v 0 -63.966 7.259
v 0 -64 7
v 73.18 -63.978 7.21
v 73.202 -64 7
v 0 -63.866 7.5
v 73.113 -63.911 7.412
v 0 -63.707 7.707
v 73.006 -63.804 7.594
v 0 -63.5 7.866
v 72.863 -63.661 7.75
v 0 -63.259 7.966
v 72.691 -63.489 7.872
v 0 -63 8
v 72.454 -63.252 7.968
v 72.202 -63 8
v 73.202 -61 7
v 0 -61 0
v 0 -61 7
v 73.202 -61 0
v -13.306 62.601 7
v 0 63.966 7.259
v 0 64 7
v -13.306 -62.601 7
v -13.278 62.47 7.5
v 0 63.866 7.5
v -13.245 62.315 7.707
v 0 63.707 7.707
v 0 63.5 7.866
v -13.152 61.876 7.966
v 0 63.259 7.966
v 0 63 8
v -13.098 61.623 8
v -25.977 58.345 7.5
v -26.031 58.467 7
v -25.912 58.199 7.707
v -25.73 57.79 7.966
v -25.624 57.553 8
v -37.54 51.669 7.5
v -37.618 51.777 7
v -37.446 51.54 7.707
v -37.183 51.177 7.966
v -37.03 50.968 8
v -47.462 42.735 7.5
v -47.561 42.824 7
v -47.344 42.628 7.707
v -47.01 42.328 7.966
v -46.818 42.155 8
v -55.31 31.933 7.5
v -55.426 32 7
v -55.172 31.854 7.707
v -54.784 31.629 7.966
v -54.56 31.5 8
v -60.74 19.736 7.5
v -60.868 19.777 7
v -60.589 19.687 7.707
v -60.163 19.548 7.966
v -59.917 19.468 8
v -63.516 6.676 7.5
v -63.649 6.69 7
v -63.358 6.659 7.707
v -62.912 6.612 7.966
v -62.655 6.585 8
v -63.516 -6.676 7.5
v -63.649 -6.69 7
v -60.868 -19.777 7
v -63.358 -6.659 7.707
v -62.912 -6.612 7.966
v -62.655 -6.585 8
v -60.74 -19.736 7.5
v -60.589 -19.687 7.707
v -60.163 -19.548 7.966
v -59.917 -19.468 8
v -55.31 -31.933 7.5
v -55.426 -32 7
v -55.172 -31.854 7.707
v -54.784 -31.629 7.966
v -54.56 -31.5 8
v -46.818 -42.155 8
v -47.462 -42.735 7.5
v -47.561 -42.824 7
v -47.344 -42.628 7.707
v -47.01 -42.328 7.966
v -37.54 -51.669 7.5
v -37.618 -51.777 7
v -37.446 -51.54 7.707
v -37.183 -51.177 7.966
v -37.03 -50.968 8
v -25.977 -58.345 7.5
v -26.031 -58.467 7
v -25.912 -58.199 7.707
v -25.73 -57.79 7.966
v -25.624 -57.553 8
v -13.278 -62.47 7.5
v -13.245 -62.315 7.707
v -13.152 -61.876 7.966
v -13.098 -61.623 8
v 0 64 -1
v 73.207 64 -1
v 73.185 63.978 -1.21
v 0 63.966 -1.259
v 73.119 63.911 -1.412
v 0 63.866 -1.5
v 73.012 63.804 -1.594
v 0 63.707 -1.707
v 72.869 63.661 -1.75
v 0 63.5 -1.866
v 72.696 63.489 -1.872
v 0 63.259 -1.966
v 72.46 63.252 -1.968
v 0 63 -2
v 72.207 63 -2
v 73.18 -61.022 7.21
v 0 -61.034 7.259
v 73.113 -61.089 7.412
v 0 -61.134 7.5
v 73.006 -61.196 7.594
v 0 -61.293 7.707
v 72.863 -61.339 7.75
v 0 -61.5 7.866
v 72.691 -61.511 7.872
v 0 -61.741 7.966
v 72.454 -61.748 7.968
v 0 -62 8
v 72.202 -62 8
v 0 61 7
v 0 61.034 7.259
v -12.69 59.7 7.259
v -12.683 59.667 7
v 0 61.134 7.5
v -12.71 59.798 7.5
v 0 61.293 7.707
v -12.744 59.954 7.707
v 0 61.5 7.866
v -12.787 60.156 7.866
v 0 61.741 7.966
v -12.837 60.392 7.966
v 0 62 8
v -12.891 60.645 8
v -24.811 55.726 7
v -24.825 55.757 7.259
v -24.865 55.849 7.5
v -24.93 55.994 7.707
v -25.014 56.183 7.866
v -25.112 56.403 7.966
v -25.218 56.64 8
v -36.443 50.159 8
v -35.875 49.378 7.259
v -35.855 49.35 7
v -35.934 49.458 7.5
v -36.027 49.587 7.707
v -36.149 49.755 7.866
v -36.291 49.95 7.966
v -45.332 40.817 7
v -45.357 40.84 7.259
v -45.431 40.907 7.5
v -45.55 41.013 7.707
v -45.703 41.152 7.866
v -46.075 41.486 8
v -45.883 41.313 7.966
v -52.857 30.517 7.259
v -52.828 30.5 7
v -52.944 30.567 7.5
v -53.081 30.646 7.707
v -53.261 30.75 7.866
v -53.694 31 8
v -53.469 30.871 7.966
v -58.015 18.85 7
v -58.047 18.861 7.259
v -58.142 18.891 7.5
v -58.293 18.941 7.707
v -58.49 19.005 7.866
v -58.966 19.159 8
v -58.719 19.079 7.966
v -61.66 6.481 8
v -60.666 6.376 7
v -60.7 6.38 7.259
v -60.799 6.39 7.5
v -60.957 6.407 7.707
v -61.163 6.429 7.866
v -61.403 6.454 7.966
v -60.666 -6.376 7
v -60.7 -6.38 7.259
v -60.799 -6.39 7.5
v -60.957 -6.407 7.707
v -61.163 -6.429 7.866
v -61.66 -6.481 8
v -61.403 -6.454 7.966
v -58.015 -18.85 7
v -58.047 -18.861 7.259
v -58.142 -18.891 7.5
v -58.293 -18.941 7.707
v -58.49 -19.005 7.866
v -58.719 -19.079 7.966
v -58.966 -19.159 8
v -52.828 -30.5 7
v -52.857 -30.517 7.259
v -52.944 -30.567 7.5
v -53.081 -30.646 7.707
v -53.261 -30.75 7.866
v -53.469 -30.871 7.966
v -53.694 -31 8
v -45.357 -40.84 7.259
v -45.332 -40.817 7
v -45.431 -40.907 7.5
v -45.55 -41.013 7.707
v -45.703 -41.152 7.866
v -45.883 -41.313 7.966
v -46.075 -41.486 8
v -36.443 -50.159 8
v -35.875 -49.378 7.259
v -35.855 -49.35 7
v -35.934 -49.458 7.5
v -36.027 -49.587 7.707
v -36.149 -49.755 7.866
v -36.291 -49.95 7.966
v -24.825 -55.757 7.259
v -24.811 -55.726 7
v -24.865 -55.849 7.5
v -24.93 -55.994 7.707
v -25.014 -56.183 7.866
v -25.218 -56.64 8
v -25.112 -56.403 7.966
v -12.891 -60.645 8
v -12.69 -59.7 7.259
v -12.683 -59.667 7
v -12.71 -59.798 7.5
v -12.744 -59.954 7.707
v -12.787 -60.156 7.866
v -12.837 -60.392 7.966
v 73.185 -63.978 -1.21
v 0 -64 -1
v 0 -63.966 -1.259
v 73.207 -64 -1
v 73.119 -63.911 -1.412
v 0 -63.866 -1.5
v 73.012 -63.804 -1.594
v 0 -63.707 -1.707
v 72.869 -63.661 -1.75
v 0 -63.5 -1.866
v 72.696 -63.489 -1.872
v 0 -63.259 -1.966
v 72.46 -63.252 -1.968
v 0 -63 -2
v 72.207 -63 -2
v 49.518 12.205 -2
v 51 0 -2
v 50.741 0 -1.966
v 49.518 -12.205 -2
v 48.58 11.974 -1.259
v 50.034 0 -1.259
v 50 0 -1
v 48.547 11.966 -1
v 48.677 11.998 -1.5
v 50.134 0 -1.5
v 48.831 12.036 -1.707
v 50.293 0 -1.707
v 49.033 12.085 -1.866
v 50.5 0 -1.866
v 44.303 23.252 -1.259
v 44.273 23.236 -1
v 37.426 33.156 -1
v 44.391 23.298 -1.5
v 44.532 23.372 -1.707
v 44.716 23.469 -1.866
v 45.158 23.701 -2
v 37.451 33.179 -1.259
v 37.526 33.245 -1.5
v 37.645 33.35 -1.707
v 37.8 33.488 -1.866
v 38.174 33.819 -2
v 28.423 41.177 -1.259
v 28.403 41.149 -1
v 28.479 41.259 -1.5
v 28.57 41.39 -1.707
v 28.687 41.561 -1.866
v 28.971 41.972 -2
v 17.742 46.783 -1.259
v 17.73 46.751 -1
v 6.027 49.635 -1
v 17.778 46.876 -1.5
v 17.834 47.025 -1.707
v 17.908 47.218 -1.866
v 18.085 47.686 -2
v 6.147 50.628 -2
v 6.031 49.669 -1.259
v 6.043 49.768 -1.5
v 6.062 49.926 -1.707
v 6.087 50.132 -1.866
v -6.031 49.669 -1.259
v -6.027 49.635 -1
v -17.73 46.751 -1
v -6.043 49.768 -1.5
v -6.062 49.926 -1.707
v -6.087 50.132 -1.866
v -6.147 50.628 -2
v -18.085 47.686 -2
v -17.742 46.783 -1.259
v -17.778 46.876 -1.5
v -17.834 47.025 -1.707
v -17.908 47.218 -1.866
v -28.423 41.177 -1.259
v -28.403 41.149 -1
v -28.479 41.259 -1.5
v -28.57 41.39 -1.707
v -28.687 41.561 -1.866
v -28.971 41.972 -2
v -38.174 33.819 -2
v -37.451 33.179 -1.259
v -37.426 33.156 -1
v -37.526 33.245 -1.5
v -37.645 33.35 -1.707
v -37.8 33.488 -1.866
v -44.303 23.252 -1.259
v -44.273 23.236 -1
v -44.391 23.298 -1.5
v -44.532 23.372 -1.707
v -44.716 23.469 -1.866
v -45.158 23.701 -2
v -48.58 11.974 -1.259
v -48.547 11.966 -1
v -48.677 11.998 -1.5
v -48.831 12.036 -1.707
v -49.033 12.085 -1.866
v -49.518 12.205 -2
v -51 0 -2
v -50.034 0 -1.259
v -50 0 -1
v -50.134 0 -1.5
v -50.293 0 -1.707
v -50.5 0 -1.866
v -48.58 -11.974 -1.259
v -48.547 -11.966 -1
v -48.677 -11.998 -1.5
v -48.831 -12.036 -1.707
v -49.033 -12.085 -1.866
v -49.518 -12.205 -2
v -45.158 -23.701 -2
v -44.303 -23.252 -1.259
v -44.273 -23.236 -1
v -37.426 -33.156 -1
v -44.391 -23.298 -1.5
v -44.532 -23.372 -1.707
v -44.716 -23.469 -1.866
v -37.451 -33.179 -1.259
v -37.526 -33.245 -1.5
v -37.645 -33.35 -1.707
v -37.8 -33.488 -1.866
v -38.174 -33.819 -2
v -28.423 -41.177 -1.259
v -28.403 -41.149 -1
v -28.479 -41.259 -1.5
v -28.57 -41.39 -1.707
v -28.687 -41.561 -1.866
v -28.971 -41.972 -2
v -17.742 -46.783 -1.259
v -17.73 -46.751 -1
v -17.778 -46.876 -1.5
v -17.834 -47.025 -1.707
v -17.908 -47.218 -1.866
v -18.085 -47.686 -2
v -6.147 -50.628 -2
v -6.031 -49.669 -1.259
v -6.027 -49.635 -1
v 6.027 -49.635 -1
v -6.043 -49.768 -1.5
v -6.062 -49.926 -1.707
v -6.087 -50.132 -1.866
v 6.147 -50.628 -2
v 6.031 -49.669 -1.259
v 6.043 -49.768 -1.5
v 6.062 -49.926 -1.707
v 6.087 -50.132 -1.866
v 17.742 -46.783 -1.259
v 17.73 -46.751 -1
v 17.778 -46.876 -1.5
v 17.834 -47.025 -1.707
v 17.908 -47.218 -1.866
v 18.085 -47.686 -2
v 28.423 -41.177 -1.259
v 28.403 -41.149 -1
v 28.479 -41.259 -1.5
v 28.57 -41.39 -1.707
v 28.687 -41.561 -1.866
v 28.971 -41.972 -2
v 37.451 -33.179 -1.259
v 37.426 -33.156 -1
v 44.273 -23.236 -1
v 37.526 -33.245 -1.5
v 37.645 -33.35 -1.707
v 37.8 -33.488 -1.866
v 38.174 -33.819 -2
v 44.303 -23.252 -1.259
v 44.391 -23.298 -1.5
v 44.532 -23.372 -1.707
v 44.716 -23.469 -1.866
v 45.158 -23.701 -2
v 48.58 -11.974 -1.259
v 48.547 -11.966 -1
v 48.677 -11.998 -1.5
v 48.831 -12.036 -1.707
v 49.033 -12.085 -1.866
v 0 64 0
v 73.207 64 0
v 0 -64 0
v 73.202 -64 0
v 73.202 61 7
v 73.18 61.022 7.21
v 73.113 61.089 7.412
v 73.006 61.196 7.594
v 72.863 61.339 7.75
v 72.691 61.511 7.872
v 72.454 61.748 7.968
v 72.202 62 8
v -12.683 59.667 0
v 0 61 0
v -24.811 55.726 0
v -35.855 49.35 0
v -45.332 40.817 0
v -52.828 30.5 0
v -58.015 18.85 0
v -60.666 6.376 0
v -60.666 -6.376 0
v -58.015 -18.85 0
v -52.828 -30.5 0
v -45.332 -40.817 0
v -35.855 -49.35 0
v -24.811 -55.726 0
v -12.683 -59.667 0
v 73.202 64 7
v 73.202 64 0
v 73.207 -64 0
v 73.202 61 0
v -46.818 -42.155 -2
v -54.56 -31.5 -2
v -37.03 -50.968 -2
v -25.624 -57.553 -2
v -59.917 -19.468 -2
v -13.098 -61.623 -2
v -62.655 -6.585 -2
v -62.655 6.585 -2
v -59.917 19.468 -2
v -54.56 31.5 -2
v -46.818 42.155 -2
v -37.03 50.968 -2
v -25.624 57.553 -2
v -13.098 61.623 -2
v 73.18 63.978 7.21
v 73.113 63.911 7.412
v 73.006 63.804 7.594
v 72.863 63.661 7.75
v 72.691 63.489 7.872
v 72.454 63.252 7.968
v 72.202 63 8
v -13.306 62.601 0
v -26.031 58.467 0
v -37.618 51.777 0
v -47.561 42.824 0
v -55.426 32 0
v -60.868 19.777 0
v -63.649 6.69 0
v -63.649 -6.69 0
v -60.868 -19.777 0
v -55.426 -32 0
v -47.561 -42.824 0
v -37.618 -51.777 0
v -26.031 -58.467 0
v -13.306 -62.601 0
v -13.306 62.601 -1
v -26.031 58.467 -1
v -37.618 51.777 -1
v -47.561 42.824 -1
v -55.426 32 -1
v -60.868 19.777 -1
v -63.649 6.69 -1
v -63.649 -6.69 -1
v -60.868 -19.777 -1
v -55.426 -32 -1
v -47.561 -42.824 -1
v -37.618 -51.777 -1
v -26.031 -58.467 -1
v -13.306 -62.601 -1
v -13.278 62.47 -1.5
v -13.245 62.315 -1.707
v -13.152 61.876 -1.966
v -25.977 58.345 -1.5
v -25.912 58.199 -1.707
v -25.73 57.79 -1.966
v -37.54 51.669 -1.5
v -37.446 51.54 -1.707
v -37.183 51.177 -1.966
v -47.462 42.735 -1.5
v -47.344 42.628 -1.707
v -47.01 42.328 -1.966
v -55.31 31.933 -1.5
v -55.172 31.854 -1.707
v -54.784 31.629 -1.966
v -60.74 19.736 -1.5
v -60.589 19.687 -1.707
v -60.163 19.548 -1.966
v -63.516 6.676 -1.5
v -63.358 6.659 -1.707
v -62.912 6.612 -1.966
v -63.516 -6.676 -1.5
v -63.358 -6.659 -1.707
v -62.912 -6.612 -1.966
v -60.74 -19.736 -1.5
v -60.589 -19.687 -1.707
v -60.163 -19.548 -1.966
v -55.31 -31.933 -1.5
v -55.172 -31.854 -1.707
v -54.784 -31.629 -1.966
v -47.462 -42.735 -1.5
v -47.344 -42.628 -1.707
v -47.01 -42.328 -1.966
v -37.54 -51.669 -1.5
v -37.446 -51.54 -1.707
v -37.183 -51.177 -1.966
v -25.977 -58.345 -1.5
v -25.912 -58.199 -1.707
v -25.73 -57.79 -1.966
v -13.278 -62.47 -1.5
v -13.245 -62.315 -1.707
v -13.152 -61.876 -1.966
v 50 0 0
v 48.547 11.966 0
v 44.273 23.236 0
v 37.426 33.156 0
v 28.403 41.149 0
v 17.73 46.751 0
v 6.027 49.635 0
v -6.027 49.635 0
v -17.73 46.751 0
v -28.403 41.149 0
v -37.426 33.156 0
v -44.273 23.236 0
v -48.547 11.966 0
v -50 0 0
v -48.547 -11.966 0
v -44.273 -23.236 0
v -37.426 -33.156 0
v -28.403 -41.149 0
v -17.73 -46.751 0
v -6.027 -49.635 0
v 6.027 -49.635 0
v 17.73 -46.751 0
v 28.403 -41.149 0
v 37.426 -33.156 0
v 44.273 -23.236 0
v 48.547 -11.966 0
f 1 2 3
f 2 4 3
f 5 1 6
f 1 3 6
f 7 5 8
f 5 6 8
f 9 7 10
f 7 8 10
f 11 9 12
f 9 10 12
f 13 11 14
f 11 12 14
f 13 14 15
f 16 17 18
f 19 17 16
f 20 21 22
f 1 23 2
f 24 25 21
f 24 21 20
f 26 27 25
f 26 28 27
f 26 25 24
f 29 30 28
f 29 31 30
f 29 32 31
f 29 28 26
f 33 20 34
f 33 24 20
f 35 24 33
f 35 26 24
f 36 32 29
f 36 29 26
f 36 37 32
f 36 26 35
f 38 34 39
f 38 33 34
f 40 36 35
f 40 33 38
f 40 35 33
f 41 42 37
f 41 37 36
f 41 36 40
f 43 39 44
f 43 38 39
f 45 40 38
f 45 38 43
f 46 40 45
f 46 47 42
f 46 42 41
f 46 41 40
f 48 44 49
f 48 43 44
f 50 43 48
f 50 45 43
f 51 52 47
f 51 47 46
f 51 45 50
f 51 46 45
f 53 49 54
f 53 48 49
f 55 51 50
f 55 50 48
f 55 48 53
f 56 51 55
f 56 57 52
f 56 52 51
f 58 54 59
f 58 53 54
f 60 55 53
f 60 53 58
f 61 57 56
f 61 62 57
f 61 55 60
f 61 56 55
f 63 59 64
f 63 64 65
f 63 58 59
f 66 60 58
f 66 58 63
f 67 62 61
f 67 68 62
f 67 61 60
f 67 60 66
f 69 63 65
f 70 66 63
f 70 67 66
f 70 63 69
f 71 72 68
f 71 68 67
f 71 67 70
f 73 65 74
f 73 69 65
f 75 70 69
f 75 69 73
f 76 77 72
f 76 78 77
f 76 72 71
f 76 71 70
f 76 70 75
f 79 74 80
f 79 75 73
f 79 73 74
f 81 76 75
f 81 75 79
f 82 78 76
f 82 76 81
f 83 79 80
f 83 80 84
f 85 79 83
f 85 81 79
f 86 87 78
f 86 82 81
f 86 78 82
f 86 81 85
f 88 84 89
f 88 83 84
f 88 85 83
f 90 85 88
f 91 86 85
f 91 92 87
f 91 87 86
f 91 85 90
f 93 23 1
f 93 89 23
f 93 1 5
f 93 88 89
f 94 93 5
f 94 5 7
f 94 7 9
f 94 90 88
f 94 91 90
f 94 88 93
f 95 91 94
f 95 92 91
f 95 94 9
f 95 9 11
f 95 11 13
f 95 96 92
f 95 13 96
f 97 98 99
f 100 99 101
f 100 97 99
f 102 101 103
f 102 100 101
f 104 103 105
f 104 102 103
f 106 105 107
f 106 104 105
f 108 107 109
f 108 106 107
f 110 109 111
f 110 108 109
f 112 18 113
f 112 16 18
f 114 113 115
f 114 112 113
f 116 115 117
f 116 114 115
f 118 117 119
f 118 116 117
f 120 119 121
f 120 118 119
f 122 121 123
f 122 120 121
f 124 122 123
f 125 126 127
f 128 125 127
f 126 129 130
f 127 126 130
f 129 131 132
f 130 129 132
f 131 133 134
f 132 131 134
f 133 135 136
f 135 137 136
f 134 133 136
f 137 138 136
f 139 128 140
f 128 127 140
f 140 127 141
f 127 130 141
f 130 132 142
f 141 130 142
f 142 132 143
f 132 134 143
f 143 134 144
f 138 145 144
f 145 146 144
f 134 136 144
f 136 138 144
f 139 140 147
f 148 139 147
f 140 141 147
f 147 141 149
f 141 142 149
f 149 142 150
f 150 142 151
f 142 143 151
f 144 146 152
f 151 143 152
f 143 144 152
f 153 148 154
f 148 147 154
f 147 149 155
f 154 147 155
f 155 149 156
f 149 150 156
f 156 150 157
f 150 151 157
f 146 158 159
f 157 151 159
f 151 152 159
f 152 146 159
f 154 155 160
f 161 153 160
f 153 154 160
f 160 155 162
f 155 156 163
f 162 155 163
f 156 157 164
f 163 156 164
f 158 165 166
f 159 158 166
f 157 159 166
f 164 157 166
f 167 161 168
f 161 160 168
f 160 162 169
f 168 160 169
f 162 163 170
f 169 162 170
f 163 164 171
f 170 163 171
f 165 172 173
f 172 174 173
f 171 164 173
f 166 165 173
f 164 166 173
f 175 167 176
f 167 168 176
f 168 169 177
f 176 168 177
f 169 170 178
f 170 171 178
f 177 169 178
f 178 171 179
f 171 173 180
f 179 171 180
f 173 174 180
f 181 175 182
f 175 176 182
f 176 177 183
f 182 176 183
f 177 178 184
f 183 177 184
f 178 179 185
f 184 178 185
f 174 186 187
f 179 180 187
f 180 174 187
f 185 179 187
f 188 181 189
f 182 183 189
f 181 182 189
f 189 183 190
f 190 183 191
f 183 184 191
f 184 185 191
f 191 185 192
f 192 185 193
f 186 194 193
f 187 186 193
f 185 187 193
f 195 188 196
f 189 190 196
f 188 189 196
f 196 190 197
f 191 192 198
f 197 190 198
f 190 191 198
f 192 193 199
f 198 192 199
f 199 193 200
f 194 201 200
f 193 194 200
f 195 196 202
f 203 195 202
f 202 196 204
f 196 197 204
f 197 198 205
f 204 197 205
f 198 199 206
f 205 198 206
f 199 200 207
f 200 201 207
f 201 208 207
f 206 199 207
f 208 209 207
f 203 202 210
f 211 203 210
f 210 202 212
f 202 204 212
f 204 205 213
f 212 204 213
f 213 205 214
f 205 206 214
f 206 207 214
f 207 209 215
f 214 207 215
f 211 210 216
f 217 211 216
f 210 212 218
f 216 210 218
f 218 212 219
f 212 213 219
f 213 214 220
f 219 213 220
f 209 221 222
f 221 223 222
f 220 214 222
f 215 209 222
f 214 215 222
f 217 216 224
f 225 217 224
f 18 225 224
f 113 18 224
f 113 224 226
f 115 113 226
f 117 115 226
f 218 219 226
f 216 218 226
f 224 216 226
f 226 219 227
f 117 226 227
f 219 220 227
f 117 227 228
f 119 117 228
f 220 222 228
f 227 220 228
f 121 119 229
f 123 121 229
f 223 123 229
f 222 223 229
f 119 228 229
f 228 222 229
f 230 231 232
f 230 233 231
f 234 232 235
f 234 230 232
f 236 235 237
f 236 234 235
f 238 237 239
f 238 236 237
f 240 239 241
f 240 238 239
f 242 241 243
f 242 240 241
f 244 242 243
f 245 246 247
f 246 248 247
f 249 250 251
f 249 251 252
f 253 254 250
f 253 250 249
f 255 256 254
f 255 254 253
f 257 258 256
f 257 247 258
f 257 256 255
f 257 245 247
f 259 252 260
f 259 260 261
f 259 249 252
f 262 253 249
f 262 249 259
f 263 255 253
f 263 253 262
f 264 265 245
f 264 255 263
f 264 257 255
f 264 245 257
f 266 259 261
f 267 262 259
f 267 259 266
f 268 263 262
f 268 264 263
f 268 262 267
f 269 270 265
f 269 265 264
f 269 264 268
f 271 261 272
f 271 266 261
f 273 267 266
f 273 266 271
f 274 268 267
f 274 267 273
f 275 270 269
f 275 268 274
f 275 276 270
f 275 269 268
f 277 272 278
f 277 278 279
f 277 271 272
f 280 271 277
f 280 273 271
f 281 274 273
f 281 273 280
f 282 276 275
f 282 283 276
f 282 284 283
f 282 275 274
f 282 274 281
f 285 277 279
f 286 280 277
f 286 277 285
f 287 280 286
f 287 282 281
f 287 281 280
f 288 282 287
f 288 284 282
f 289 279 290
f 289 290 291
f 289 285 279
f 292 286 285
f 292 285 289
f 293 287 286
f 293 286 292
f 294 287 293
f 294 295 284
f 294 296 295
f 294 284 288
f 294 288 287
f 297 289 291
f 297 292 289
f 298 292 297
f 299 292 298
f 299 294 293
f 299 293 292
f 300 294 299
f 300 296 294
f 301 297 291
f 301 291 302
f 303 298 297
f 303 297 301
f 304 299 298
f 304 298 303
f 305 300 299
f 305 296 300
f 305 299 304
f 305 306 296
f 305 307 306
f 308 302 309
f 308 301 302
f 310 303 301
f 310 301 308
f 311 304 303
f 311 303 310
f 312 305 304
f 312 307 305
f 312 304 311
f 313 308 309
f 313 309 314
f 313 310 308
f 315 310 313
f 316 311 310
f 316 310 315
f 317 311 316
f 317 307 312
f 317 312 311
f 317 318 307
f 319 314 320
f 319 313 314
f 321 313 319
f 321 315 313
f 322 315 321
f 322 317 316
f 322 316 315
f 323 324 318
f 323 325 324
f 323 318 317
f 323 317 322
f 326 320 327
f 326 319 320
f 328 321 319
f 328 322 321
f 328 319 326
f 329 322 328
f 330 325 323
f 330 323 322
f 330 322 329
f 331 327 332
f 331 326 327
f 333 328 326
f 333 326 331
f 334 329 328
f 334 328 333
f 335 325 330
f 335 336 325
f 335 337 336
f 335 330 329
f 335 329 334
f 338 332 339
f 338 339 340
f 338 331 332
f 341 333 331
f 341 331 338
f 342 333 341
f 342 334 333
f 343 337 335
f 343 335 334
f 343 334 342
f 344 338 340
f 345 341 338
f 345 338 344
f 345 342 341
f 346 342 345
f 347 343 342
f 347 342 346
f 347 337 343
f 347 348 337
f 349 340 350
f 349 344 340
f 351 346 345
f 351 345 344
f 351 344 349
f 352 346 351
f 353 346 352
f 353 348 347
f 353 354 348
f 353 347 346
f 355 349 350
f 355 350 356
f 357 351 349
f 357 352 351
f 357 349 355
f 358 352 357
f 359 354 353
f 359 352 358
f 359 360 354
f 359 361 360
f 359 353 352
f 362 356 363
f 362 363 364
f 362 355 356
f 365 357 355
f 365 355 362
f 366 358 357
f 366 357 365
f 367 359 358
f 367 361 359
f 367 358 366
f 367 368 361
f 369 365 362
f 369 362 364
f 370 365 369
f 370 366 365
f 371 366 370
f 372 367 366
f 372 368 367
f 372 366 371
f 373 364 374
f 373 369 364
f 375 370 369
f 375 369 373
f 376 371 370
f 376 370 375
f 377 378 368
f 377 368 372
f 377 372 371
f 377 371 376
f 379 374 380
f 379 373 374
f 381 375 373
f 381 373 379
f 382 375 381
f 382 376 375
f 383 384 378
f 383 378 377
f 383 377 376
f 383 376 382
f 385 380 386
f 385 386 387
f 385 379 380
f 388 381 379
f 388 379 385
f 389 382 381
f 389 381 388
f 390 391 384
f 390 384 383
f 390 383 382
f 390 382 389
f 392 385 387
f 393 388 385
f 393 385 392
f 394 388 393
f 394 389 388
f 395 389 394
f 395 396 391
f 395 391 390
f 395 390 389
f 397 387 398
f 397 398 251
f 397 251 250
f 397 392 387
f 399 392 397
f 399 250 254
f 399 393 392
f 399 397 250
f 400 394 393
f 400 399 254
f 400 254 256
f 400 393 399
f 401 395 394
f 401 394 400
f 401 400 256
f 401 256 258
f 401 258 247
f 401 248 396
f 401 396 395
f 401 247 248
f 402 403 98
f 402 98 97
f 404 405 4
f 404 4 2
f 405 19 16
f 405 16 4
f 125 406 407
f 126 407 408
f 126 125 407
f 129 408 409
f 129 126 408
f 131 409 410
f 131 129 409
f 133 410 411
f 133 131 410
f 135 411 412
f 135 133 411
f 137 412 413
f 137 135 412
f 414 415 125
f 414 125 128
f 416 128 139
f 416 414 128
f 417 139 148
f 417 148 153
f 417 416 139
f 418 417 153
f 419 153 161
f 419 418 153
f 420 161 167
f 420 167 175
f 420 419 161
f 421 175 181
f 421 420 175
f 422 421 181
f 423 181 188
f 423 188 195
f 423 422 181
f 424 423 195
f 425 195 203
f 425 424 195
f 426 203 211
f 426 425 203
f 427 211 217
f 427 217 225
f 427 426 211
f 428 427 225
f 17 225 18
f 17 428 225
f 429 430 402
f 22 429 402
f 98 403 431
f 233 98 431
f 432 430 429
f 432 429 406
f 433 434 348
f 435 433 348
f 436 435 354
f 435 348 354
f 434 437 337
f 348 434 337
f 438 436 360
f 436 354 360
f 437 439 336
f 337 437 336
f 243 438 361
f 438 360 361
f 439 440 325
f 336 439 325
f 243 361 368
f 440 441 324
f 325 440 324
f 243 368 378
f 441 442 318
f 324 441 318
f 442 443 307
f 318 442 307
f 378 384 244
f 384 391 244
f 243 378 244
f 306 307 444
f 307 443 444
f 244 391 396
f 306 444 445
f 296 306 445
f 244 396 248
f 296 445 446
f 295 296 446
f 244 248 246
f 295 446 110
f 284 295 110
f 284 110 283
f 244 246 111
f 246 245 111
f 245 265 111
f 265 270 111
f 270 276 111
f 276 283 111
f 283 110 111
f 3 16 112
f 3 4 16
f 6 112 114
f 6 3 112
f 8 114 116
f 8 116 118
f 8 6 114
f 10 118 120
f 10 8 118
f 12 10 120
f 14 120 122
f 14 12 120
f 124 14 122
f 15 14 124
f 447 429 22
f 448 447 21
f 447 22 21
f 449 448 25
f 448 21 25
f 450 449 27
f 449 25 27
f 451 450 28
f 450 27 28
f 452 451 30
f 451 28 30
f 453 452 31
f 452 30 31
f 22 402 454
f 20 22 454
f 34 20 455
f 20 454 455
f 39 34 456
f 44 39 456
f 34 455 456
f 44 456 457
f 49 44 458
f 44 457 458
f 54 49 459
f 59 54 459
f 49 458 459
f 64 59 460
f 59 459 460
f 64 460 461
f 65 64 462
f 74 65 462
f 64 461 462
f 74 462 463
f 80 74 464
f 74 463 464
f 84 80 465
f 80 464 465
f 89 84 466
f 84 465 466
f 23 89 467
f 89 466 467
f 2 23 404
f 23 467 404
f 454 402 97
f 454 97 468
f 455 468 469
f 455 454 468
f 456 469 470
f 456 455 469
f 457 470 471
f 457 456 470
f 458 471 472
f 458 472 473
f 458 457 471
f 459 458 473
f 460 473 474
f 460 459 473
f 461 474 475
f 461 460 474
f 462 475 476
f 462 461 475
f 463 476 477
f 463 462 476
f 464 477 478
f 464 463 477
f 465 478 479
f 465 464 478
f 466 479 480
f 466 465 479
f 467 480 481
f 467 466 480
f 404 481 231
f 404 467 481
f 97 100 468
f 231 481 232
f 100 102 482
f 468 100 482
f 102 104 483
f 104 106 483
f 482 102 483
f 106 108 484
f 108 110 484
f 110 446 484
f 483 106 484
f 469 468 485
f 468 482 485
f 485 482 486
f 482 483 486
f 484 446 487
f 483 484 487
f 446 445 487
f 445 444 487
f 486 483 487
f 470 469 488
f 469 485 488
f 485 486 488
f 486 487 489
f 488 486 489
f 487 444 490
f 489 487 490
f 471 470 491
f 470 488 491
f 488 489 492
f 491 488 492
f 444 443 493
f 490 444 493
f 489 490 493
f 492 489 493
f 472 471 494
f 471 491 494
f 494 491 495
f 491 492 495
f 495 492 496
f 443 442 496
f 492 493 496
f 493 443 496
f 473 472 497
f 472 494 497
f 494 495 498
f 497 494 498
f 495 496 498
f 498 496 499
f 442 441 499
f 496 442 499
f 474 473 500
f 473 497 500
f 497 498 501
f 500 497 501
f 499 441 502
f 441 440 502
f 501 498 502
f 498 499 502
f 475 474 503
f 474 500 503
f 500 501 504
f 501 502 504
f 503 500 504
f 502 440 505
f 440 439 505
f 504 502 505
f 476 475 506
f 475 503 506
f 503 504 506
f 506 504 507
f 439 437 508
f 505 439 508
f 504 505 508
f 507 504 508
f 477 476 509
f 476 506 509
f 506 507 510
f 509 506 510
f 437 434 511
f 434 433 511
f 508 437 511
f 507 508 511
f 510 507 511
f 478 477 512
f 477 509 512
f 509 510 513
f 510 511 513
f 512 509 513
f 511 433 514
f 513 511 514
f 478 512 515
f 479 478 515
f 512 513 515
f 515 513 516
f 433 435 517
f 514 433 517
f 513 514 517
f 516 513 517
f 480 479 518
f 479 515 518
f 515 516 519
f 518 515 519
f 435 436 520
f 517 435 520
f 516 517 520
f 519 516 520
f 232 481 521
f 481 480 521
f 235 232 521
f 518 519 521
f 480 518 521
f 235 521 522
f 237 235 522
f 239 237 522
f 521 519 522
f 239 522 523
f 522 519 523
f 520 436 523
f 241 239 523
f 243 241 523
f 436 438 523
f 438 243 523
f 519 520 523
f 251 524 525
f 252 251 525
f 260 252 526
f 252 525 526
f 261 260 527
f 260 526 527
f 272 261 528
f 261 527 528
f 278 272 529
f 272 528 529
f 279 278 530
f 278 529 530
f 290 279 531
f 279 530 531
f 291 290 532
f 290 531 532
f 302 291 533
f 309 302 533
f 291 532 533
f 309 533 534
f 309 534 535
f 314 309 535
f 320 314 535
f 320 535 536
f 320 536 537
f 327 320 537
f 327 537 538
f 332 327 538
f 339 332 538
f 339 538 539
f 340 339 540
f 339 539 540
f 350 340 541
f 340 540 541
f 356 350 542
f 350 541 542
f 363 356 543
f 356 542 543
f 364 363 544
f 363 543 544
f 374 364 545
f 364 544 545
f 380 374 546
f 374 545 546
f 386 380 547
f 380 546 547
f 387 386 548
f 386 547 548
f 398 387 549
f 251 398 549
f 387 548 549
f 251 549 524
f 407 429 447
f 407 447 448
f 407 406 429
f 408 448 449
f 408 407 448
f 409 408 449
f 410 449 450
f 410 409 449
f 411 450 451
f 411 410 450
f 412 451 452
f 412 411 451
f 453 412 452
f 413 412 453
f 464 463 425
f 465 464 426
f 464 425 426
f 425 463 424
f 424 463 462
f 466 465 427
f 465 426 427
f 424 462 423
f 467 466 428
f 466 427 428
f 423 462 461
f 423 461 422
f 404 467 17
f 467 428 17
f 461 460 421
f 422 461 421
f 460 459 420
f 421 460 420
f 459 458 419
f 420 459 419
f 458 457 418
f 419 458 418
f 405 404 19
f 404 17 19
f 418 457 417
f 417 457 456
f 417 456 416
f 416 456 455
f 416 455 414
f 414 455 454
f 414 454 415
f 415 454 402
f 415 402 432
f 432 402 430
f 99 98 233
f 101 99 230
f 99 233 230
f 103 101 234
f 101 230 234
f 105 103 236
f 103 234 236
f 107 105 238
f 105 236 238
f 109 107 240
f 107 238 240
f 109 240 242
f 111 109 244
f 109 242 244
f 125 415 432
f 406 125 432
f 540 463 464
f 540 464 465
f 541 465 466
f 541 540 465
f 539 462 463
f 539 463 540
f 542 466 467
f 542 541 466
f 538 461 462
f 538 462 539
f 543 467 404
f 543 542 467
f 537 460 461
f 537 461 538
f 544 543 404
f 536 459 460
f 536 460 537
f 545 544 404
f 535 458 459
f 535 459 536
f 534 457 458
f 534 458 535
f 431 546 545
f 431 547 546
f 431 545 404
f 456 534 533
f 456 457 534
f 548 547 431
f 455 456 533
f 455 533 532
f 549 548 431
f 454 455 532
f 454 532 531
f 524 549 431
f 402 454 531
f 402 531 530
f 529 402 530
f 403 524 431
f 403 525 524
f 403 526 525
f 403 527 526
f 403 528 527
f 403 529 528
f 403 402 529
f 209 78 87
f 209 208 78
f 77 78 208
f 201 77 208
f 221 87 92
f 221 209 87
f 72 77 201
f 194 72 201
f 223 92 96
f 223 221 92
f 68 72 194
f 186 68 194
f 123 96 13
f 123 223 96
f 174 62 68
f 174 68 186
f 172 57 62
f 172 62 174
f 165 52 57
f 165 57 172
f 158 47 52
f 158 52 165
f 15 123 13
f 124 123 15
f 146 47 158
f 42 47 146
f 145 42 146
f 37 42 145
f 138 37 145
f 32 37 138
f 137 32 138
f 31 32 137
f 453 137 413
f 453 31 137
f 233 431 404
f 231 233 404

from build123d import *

# Parameters (mm, degrees)
PAD001_DEPTH = 8
FILLET_R     = 1
SKETCH001_R  = 50
PAD_DEPTH    = 2
FILLET001_R  = 1


with BuildPart() as fisset_inside:
    # Sketch002 → Pad001 (new body)
    with BuildSketch(Plane.XY):
        with BuildLine():
            Line((73.202, 64), (0, 64))
            ThreePointArc((0, 64), (-63.999997, 0), (0, -64))
            Line((73.202, -64), (0, -64))
            Line((73.202, -61), (73.202, -64))
            Line((0, -61), (73.202, -61))
            ThreePointArc((0, 61), (-61.000074, 0), (0, -61))
            Line((0, 61), (73.202, 61))
            Line((73.202, 64), (73.202, 61))
        make_face()
    extrude(amount=PAD001_DEPTH)

    # Fillet
    fillet_edges = [fisset_inside.edges().sort_by_distance(p)[0] for p in [
        (36.601, 64, 8),
        (-63.999997, 0, 8),
        (36.601, -64, 8),
        (73.202, -62.5, 8),
        (36.601, -61, 8),
        (-61.000074, 0, 8),
        (36.601, 61, 8),
        (73.202, 62.5, 8),
    ]]
    fillet(fillet_edges, radius=FILLET_R)


with BuildPart() as fillet_face:
    # Sketch001 → Pad (new body)
    with BuildSketch(Plane.XY):
        with BuildLine():
            Line((73.207341, 64), (0, 64))
            ThreePointArc((0, 64), (-64.000001, 0), (0, -64))
            Line((73.207341, -64), (0, -64))
            Line((73.207341, 64), (73.207341, -64))
        make_face()
        Circle(SKETCH001_R, mode=Mode.SUBTRACT)
    extrude(amount=-PAD_DEPTH)

    # Fillet001
    fillet001_edges = [fillet_face.edges().sort_by_distance(p)[0] for p in [
        (36.603671, 64, -2),
        (-64.000001, 0, -2),
        (36.603671, -64, -2),
        (73.207341, 0, -2),
        (-50, 0, -2),
    ]]
    fillet(fillet001_edges, radius=FILLET001_R)


solid = Compound([fisset_inside.part, fillet_face.part])
